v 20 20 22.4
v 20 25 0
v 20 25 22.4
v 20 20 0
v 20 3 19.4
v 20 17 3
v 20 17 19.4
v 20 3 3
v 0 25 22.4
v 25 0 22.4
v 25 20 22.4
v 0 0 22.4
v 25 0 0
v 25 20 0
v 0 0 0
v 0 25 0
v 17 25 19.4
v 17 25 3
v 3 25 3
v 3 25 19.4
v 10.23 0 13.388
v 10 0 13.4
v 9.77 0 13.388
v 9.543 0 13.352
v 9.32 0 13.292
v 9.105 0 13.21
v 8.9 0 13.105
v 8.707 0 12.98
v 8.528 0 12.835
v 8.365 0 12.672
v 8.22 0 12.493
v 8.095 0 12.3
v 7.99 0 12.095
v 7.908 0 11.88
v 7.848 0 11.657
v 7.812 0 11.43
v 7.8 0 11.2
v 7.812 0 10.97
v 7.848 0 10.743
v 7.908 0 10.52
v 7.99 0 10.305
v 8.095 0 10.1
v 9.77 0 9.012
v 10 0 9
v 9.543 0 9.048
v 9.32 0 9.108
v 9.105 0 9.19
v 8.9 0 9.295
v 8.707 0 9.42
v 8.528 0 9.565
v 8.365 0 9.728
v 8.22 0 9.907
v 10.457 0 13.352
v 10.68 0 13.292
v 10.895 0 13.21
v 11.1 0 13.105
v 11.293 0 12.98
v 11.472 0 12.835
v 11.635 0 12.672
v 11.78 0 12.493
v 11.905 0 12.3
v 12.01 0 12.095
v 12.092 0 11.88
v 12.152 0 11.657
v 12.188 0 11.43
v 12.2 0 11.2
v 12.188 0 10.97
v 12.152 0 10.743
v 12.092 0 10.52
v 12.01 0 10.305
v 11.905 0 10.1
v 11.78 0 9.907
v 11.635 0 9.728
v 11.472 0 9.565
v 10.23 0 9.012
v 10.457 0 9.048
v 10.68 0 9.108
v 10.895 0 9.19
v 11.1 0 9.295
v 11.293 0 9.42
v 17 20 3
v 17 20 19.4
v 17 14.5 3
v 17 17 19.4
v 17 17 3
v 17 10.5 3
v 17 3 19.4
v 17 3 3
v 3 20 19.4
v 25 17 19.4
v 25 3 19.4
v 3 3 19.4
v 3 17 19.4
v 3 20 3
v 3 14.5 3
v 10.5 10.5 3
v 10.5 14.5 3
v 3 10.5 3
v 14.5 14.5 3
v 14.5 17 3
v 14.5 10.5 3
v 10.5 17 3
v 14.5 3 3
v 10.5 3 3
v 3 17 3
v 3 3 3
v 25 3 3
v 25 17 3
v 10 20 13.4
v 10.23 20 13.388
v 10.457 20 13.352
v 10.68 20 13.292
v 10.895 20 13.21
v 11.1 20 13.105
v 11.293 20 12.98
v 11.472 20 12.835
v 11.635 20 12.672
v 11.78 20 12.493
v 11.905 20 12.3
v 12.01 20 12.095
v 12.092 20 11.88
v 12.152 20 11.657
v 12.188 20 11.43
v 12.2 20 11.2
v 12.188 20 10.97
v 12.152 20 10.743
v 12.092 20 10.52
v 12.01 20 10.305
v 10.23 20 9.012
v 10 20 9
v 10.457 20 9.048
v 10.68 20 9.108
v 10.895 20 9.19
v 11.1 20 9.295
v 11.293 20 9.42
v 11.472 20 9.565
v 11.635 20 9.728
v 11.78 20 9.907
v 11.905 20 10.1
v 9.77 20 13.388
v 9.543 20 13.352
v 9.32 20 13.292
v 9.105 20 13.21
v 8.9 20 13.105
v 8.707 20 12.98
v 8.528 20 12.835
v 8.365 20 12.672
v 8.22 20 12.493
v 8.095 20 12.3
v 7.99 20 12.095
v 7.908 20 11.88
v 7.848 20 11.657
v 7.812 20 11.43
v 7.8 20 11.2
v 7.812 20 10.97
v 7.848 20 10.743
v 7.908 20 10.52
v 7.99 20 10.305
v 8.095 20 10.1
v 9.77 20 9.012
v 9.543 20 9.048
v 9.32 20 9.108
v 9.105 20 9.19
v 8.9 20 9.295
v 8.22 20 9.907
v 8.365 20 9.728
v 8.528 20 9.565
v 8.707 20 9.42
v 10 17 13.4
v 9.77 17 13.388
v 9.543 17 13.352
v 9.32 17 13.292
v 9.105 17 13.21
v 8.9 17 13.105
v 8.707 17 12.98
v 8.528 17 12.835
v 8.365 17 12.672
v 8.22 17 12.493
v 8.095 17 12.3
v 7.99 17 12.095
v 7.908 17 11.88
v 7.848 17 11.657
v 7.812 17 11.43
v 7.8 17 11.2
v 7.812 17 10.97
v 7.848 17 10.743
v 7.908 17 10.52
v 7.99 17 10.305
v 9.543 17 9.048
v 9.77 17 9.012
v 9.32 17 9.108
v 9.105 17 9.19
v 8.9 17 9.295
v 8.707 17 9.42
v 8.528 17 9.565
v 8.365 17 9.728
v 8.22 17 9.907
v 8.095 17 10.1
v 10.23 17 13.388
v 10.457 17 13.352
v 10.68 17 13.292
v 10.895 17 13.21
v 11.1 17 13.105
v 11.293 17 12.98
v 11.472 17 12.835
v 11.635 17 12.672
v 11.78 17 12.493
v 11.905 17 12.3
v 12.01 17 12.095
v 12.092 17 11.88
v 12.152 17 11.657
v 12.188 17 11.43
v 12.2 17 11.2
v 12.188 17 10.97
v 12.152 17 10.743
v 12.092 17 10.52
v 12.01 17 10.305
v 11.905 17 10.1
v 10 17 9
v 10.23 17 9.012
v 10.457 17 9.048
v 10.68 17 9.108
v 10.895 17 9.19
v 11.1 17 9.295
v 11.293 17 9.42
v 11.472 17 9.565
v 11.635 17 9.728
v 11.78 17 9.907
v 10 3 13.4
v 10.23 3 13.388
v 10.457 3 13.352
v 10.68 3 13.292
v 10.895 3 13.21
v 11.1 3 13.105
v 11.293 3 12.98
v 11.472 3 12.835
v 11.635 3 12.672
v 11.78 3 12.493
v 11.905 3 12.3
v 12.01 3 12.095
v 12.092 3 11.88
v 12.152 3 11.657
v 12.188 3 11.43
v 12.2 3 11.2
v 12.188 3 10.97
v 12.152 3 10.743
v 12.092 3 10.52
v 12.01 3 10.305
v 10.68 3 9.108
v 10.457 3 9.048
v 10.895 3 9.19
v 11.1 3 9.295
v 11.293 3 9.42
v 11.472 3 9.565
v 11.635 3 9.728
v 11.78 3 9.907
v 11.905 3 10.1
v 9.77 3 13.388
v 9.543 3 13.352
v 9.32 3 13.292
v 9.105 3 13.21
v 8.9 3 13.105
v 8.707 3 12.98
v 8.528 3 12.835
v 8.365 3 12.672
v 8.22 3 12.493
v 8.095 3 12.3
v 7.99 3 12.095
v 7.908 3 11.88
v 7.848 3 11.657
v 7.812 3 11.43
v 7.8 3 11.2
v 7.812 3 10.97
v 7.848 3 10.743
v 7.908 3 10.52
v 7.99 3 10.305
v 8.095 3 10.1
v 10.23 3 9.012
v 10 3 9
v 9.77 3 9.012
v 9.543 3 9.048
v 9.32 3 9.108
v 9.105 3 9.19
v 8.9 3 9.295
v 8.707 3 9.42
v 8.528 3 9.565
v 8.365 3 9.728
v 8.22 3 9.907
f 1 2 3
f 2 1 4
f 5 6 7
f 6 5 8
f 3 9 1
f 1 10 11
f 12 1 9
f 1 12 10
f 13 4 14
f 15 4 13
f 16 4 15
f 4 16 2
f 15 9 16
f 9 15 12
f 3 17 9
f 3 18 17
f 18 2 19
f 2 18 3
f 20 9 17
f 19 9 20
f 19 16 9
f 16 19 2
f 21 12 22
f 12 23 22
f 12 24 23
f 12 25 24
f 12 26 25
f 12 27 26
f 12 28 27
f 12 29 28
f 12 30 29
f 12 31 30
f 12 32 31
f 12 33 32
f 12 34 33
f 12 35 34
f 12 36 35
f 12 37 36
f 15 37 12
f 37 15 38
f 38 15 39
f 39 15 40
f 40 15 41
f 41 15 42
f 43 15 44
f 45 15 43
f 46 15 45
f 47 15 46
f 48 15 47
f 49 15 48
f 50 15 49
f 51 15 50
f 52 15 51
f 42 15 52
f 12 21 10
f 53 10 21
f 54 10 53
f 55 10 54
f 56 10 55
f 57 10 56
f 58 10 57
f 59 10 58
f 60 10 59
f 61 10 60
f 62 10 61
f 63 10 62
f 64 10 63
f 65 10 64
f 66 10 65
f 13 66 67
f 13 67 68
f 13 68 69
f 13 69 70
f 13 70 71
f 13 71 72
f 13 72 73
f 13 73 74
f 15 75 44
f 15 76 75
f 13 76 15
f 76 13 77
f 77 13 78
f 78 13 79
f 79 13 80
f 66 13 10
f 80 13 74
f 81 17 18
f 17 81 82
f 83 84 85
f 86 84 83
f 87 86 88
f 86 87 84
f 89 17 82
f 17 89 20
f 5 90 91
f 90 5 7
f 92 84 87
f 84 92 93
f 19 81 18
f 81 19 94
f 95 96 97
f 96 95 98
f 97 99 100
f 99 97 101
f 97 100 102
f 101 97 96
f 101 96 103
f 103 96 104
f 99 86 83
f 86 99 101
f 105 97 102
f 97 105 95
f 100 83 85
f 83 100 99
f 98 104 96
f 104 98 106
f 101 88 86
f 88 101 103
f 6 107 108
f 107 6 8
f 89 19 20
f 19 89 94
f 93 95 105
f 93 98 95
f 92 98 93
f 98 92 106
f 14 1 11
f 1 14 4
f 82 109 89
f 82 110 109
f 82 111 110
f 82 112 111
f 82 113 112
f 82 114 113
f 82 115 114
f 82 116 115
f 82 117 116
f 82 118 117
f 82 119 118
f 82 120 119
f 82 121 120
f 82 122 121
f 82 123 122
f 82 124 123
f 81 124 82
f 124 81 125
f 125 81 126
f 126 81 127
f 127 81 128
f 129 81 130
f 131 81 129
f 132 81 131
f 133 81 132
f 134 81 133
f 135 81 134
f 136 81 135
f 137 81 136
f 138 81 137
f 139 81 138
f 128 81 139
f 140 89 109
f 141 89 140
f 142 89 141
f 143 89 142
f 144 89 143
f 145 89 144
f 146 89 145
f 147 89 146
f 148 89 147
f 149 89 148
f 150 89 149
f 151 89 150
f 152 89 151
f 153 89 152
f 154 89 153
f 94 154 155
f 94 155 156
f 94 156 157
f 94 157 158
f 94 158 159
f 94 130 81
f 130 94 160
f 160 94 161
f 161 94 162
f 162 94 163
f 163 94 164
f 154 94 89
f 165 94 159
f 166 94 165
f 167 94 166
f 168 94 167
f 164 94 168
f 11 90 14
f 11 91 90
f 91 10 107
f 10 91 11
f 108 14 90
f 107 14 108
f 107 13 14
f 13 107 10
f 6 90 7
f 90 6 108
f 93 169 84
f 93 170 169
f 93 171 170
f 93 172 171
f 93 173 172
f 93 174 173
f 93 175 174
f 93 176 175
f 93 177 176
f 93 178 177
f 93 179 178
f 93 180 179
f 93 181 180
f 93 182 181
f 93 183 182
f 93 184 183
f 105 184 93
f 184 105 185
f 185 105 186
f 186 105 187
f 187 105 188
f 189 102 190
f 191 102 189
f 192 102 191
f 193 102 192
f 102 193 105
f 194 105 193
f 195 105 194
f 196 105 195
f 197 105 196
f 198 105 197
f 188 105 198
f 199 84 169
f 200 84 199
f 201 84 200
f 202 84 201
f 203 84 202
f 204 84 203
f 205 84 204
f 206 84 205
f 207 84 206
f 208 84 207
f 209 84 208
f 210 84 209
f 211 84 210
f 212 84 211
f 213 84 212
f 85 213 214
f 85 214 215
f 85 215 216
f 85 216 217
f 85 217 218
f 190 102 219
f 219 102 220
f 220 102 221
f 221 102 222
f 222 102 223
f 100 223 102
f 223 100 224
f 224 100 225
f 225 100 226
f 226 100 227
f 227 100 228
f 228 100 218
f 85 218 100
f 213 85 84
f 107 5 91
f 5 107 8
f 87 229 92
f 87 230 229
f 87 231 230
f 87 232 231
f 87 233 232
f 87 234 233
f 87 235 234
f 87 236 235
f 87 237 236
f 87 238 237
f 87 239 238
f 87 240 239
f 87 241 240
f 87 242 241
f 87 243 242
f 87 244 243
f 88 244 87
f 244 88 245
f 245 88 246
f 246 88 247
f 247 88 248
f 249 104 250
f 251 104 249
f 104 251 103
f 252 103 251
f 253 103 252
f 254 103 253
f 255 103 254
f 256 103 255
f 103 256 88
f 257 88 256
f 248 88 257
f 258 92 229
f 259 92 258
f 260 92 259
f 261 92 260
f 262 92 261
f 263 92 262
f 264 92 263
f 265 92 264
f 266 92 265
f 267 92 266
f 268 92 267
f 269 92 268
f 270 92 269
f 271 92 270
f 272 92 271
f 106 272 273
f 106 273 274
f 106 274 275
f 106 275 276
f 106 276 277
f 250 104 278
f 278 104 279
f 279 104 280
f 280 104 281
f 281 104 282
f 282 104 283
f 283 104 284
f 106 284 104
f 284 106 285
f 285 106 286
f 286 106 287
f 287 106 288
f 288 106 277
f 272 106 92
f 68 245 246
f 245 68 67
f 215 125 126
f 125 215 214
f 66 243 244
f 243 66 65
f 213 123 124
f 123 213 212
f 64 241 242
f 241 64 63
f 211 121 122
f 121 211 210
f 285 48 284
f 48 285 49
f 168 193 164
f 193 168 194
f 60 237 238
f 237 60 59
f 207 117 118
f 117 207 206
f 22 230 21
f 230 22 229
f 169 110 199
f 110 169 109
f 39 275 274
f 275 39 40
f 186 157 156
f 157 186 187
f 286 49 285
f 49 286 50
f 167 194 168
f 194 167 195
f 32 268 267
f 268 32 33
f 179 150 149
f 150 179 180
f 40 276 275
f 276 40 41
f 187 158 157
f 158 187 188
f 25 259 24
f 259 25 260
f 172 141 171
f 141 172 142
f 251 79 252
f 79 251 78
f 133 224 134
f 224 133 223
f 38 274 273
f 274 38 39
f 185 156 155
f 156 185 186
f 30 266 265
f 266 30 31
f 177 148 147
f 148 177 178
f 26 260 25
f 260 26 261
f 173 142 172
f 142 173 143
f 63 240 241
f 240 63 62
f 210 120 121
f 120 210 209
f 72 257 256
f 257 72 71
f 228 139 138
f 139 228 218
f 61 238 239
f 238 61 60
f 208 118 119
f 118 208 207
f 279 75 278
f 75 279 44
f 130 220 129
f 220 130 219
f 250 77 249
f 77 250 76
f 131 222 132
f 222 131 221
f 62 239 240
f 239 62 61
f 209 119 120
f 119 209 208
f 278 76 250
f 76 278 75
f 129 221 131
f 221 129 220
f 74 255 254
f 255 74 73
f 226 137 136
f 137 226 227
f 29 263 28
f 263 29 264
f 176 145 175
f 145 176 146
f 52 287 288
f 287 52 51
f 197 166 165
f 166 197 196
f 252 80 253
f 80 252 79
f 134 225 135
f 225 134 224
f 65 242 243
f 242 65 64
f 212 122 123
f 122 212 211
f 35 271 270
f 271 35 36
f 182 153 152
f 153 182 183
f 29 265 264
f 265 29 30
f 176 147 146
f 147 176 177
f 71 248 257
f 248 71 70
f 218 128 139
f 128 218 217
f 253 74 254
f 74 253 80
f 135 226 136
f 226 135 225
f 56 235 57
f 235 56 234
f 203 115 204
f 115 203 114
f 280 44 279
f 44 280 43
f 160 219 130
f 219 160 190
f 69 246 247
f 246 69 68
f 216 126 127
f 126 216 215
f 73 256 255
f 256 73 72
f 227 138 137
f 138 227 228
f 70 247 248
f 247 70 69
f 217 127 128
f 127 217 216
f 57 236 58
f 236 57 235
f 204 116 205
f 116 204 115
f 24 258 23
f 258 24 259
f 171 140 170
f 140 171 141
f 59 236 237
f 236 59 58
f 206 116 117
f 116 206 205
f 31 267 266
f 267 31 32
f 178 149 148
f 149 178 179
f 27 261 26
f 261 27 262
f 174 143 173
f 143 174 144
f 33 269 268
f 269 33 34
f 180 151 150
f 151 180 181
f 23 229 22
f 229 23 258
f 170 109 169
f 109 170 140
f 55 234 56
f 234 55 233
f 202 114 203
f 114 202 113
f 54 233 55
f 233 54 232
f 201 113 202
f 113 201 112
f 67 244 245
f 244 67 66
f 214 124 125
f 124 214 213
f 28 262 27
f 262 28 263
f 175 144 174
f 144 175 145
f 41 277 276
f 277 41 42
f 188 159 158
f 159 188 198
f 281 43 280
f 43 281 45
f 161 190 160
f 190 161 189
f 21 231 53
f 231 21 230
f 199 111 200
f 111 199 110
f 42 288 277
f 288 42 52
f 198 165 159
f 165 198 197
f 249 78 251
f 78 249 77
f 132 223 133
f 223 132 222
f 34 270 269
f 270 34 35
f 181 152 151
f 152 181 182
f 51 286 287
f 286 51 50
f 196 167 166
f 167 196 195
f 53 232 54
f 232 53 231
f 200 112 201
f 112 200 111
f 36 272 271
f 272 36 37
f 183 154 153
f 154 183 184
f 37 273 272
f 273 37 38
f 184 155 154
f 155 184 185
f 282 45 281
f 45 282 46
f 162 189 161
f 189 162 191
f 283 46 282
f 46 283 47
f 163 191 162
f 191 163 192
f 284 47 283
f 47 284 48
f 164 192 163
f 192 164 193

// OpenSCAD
// ============================================================
// CONECTORES UNIVERSALES PARA TABLEROS — 16mm (paramétrico)
// L · T · X · Recto — con pestañas de presión + taladros tornillo
// Material: PETG · Máquina: Creality SPARKX i7
// ============================================================

// ===== PARÁMETROS (edita aquí) =====
grosor_tablero = 16;      // mm — grosor del tablero (melamina, contrachapado...)
holgura        = 0.4;     // mm — holgura de ajuste (0.3-0.5 para PETG)
pared          = 3.0;     // mm — grosor de pared del conector
ancho_brazo    = 20;      // mm — ancho del brazo que abraza el tablero
prof_brazo     = 25;      // mm — profundidad del brazo (cuánto abraza)
pestana        = 1.2;     // mm — grosor de la pestaña de presión
pestana_altura = 4.0;     // mm — altura de la pestaña
taladro_d      = 4.4;     // mm — Ø taladro para tornillo autorroscante
taladro_off    = 8;       // mm — distancia del taladro al borde
$fn = 60;

// ===== DERIVADOS =====
canal = grosor_tablero + holgura;   // ancho del canal que abraza el tablero
alto  = canal + 2*pared;            // alto total del conector

// ============================================================
// MÓDULO: canal con pestañas de presión (abraza el tablero)
// longitud = cuánto abraza (prof_brazo para un brazo, 2*prof_brazo para empalme)
// ============================================================
module canal_presion(longitud = prof_brazo) {
    difference() {
        // cuerpo del canal (U invertida)
        union() {
            cube([ancho_brazo, longitud, alto]);                       // base
            translate([0, 0, 0]) cube([pared, longitud, alto]);        // pared izq
            translate([ancho_brazo-pared, 0, 0]) cube([pared, longitud, alto]); // pared der
        }
        // vaciado del canal (donde entra el tablero)
        translate([pared, -0.1, pared])
            cube([ancho_brazo-2*pared, longitud+0.2, canal]);
    }
    // pestañas de presión (clips elásticos) en las paredes
    translate([pared, longitud/2 - pestana_altura/2, alto - pestana])
        cube([ancho_brazo-2*pared, pestana_altura, pestana]);
    translate([pared, longitud/2 - pestana_altura/2, pared - pestana])
        cube([ancho_brazo-2*pared, pestana_altura, pestana]);
}

// ============================================================
// MÓDULO: taladros para tornillo (a lo largo del brazo)
// ============================================================
module taladros(longitud = prof_brazo) {
    translate([ancho_brazo/2, taladro_off, alto/2])
        rotate([90, 0, 0]) cylinder(d=taladro_d, h=longitud+1, center=true);
    translate([ancho_brazo/2, longitud-taladro_off, alto/2])
        rotate([90, 0, 0]) cylinder(d=taladro_d, h=longitud+1, center=true);
}

// ============================================================
// CONECTOR L (esquina) — dos canales a 90°
// ============================================================
module conector_L() {
    difference() {
        union() {
            canal_presion();
            rotate([0, 0, 90])
                translate([0, -prof_brazo, 0])
                    canal_presion();
            // refuerzo de esquina
            translate([0, 0, 0])
                cube([pared, pared, alto]);
        }
        taladros();
    }
}

// ============================================================
// CONECTOR T (balda entra en lateral) — canal central + 2 laterales
// ============================================================
module conector_T() {
    difference() {
        union() {
            canal_presion();
            // brazo central (la balda)
            rotate([0, 0, 90])
                translate([0, -prof_brazo, 0])
                    canal_presion();
            // brazo opuesto
            rotate([0, 0, -90])
                translate([0, 0, 0])
                    canal_presion();
        }
        taladros();
    }
}

// ============================================================
// CONECTOR X (cruce de dos tableros) — 4 brazos
// ============================================================
module conector_X() {
    difference() {
        union() {
            canal_presion();
            rotate([0, 0, 90])  translate([0, -prof_brazo, 0]) canal_presion();
            rotate([0, 0, 180]) translate([0, -prof_brazo, 0]) canal_presion();
            rotate([0, 0, -90]) translate([0, 0, 0]) canal_presion();
        }
        taladros();
    }
}

// ============================================================
// CONECTOR RECTO (empalme en línea) — canal largo que abraza ambos
// ============================================================
module conector_recto() {
    difference() {
        canal_presion(2*prof_brazo);
        taladros(2*prof_brazo);
    }
}

// ============================================================
// SELECCIÓN — cambia el tipo aquí
// ============================================================
tipo = "L";  // "L" | "T" | "X" | "RECTO"

if (tipo == "L")     conector_L();
if (tipo == "T")     conector_T();
if (tipo == "X")     conector_X();
if (tipo == "RECTO") conector_recto();
